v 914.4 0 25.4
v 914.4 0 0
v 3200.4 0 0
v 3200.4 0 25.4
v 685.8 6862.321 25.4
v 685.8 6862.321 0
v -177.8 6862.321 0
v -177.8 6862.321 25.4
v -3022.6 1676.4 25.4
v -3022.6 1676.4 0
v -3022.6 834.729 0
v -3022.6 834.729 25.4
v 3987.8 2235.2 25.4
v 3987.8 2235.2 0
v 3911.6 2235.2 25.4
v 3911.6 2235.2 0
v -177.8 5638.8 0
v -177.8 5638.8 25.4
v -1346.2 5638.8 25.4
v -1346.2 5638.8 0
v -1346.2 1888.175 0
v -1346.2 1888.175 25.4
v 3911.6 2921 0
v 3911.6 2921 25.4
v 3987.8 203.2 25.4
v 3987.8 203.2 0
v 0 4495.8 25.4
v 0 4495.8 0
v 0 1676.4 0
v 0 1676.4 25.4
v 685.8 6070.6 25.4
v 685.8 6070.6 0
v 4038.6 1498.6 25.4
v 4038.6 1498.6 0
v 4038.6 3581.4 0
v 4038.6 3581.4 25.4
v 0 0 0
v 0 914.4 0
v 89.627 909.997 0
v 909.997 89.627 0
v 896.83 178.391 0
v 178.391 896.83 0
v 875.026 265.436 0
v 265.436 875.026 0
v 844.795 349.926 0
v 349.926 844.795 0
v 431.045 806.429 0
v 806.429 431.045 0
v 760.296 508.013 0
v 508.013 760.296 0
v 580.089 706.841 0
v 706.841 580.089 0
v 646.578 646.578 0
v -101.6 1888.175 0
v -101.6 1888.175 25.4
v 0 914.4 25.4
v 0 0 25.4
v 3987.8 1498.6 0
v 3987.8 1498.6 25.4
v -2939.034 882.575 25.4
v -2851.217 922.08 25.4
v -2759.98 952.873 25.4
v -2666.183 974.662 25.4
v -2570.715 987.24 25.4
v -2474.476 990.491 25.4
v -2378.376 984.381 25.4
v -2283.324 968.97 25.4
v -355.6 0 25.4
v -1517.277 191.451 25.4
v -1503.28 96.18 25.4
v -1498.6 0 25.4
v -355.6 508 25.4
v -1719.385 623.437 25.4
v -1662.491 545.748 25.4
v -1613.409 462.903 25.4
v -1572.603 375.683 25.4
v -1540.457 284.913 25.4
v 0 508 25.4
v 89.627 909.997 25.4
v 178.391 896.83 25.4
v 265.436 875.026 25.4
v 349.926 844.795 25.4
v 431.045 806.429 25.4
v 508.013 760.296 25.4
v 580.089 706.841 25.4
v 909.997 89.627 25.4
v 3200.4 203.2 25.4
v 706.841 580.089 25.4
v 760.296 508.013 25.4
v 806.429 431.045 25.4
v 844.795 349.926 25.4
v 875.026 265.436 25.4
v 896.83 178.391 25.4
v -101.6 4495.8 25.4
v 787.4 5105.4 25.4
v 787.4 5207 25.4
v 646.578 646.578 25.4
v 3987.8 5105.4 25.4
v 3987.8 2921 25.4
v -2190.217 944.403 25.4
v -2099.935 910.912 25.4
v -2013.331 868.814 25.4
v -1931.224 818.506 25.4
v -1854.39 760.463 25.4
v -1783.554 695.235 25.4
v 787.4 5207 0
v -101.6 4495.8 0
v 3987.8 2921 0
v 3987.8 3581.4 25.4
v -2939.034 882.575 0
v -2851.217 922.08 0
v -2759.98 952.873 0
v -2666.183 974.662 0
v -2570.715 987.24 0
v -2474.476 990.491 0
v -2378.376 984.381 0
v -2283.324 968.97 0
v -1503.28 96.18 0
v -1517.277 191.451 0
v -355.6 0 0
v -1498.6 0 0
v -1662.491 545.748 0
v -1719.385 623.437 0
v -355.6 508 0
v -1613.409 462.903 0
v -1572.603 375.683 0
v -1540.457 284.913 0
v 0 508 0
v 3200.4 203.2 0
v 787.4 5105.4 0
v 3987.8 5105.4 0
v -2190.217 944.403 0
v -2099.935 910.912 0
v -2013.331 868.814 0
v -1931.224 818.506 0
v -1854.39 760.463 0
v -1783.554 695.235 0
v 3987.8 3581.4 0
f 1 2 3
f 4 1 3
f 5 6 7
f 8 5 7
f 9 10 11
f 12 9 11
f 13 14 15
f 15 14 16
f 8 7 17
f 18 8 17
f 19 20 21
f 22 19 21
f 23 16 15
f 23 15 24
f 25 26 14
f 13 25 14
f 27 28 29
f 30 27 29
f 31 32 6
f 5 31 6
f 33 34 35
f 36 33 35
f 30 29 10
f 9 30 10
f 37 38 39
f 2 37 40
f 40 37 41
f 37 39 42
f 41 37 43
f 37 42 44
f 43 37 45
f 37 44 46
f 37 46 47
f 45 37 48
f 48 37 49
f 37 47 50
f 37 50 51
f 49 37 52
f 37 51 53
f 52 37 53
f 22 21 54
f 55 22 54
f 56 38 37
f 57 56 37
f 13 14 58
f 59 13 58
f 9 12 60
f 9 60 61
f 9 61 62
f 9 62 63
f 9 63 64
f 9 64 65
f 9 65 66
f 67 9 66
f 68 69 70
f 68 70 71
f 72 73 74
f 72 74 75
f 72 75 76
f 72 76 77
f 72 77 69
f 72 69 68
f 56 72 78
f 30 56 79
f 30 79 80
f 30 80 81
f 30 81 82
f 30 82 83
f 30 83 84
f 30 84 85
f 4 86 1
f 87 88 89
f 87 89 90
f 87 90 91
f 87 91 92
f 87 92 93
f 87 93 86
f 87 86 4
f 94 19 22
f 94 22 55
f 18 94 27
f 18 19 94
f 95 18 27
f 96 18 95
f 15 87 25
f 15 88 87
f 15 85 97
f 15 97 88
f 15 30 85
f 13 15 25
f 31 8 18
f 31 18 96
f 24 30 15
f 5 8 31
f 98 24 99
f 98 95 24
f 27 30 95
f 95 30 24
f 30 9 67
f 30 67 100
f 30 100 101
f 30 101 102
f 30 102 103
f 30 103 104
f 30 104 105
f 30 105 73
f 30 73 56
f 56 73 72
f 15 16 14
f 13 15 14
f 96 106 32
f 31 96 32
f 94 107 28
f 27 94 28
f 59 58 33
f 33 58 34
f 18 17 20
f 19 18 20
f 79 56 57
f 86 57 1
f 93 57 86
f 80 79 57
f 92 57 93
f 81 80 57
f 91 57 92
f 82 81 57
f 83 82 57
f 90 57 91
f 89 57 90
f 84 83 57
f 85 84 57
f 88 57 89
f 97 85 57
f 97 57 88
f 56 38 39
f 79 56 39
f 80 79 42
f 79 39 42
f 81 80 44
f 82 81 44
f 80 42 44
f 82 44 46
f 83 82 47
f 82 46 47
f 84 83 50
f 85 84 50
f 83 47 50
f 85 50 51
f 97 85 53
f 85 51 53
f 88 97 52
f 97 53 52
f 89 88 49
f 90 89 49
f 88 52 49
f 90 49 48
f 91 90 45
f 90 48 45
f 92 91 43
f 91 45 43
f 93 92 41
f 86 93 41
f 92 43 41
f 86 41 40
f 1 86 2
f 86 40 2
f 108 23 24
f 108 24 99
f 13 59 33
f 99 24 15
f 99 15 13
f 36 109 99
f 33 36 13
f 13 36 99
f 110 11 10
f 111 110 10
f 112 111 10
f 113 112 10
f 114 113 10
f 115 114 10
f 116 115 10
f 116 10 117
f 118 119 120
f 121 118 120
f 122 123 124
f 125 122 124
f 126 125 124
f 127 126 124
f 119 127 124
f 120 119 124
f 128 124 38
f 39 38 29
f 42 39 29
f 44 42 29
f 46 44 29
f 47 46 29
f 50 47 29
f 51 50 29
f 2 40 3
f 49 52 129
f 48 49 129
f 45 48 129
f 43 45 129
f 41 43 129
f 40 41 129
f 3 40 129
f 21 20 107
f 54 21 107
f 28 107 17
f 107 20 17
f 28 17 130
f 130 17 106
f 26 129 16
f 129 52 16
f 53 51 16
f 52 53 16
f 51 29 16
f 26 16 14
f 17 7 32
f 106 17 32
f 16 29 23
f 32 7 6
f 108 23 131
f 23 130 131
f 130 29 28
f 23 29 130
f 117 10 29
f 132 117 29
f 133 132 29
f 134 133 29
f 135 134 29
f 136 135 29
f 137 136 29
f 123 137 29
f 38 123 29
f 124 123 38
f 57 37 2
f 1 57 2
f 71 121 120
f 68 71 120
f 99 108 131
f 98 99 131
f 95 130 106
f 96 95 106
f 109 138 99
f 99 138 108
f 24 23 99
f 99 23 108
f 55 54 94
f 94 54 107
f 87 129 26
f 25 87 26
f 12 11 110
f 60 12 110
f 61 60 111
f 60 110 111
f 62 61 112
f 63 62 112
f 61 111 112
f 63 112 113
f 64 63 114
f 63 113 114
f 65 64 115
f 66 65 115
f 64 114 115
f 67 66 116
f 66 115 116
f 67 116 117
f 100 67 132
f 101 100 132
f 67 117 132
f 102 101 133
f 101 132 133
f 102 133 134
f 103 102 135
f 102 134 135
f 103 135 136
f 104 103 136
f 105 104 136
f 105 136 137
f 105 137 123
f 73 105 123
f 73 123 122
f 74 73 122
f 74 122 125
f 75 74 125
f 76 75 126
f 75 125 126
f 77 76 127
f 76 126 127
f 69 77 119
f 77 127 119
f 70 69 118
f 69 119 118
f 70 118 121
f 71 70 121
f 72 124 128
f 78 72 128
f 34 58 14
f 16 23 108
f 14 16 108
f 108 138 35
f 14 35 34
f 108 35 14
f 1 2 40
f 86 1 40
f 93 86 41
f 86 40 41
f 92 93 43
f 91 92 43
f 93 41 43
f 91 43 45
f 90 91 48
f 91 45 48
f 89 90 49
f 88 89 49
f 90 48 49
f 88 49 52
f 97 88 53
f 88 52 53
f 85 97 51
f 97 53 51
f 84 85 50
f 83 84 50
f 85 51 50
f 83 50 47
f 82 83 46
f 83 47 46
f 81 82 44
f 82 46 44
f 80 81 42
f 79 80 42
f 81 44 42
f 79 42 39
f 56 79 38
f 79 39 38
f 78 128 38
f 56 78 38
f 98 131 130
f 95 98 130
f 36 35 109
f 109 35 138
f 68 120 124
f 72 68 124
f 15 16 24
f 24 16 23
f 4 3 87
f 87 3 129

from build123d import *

# Parameters (mm, degrees)
F1_DEPTH = 25.4
F0_W     = 76.2
F0_H     = 685.8
F2_DEPTH = 25.4
F3_DEPTH = 25.4


# Not quite as in the source:
# - a feature names something its author has since deleted; it is built from what else it names


with BuildPart() as f1:
    # F0 (on Top) → F1 (new body)
    with BuildSketch(Plane.XY):
        with BuildLine():
            Line((914.4, 0), (3200.4, 0))
            Line((3200.4, 0), (3200.4, 203.2))
            Line((3200.4, 203.2), (3987.8, 203.2))
            Line((3987.8, 203.2), (3987.8, 1498.6))
            Line((3987.8, 1498.6), (3987.8, 2235.2))
            Line((3987.8, 2235.2), (3911.6, 2235.2))
            Line((3911.6, 2235.2), (3911.6, 2921))
            Line((3911.6, 2921), (3987.8, 2921))
            Line((3987.8, 2921), (3987.8, 3581.4))
            Line((3987.8, 3581.4), (3987.8, 5105.4))
            Line((3987.8, 5105.4), (787.4, 5105.4))
            Line((787.4, 5105.4), (787.4, 5207))
            Line((787.4, 5207), (701.3347370419, 5938.5547351442))
            Line((701.3347370419, 5938.5547351442), (685.8, 6070.6))
            Line((685.8, 6070.6), (685.8, 6862.3206634521))
            Line((685.8, 6862.3206634521), (-177.8, 6862.3206634521))
            Line((-177.8, 6862.3206634521), (-177.8, 6477))
            Line((-177.8, 6477), (-177.8, 5740.4))
            Line((-177.8, 5740.4), (-177.8, 5638.8))
            Line((-177.8, 5638.8), (-1346.2, 5638.8))
            Line((-1346.2, 5638.8), (-1346.2, 1888.175368309))
            Line((-1346.2, 1888.175368309), (-101.6, 1888.175368309))
            Line((-101.6, 1888.175368309), (-101.6, 4495.8))
            Line((-101.6, 4495.8), (0, 4495.8))
            Line((0, 4495.8), (0, 1676.4))
            Line((0, 1676.4), (-3022.6, 1676.4))
            Line((-3022.6, 1676.4), (-3022.6, 834.7291776379))
            ThreePointArc((-3022.6, 834.7291776379), (-2013.331152522, 868.8136739255), (-1498.6, 0))
            Line((-1498.6, 0), (-355.6, 0))
            Line((-355.6, 0), (-355.6, 508))
            Line((-355.6, 508), (0, 508))
            Line((0, 508), (0, 914.4))
            ThreePointArc((0, 914.4), (646.578440717, 646.578440717), (914.4, 0))
        make_face()
    extrude(amount=F1_DEPTH)


with BuildPart() as f2:
    # F0 (on Top) → F2 (new body)
    with BuildSketch(Plane.XY):
        with Locations((3949.7, 2578.1)):
            Rectangle(F0_W, F0_H)
        Polygon((3987.8, 2235.2), (3987.8, 1498.6), (4038.6, 1498.6), (4038.6, 3581.4), (3987.8, 3581.4), (3987.8, 2921), align=None)
    extrude(amount=F2_DEPTH)


with BuildPart() as f3:
    # F0 (on Top) → F3 (new body)
    with BuildSketch(Plane.XY):
        with BuildLine():
            Line((0, 0), (914.4, 0))
            ThreePointArc((914.4, 0), (646.578440717, 646.578440717), (0, 914.4))
            Line((0, 914.4), (0, 508))
            Line((0, 508), (0, 0))
        make_face()
    extrude(amount=F3_DEPTH)


solid = Compound([f1.part, f2.part, f3.part])
